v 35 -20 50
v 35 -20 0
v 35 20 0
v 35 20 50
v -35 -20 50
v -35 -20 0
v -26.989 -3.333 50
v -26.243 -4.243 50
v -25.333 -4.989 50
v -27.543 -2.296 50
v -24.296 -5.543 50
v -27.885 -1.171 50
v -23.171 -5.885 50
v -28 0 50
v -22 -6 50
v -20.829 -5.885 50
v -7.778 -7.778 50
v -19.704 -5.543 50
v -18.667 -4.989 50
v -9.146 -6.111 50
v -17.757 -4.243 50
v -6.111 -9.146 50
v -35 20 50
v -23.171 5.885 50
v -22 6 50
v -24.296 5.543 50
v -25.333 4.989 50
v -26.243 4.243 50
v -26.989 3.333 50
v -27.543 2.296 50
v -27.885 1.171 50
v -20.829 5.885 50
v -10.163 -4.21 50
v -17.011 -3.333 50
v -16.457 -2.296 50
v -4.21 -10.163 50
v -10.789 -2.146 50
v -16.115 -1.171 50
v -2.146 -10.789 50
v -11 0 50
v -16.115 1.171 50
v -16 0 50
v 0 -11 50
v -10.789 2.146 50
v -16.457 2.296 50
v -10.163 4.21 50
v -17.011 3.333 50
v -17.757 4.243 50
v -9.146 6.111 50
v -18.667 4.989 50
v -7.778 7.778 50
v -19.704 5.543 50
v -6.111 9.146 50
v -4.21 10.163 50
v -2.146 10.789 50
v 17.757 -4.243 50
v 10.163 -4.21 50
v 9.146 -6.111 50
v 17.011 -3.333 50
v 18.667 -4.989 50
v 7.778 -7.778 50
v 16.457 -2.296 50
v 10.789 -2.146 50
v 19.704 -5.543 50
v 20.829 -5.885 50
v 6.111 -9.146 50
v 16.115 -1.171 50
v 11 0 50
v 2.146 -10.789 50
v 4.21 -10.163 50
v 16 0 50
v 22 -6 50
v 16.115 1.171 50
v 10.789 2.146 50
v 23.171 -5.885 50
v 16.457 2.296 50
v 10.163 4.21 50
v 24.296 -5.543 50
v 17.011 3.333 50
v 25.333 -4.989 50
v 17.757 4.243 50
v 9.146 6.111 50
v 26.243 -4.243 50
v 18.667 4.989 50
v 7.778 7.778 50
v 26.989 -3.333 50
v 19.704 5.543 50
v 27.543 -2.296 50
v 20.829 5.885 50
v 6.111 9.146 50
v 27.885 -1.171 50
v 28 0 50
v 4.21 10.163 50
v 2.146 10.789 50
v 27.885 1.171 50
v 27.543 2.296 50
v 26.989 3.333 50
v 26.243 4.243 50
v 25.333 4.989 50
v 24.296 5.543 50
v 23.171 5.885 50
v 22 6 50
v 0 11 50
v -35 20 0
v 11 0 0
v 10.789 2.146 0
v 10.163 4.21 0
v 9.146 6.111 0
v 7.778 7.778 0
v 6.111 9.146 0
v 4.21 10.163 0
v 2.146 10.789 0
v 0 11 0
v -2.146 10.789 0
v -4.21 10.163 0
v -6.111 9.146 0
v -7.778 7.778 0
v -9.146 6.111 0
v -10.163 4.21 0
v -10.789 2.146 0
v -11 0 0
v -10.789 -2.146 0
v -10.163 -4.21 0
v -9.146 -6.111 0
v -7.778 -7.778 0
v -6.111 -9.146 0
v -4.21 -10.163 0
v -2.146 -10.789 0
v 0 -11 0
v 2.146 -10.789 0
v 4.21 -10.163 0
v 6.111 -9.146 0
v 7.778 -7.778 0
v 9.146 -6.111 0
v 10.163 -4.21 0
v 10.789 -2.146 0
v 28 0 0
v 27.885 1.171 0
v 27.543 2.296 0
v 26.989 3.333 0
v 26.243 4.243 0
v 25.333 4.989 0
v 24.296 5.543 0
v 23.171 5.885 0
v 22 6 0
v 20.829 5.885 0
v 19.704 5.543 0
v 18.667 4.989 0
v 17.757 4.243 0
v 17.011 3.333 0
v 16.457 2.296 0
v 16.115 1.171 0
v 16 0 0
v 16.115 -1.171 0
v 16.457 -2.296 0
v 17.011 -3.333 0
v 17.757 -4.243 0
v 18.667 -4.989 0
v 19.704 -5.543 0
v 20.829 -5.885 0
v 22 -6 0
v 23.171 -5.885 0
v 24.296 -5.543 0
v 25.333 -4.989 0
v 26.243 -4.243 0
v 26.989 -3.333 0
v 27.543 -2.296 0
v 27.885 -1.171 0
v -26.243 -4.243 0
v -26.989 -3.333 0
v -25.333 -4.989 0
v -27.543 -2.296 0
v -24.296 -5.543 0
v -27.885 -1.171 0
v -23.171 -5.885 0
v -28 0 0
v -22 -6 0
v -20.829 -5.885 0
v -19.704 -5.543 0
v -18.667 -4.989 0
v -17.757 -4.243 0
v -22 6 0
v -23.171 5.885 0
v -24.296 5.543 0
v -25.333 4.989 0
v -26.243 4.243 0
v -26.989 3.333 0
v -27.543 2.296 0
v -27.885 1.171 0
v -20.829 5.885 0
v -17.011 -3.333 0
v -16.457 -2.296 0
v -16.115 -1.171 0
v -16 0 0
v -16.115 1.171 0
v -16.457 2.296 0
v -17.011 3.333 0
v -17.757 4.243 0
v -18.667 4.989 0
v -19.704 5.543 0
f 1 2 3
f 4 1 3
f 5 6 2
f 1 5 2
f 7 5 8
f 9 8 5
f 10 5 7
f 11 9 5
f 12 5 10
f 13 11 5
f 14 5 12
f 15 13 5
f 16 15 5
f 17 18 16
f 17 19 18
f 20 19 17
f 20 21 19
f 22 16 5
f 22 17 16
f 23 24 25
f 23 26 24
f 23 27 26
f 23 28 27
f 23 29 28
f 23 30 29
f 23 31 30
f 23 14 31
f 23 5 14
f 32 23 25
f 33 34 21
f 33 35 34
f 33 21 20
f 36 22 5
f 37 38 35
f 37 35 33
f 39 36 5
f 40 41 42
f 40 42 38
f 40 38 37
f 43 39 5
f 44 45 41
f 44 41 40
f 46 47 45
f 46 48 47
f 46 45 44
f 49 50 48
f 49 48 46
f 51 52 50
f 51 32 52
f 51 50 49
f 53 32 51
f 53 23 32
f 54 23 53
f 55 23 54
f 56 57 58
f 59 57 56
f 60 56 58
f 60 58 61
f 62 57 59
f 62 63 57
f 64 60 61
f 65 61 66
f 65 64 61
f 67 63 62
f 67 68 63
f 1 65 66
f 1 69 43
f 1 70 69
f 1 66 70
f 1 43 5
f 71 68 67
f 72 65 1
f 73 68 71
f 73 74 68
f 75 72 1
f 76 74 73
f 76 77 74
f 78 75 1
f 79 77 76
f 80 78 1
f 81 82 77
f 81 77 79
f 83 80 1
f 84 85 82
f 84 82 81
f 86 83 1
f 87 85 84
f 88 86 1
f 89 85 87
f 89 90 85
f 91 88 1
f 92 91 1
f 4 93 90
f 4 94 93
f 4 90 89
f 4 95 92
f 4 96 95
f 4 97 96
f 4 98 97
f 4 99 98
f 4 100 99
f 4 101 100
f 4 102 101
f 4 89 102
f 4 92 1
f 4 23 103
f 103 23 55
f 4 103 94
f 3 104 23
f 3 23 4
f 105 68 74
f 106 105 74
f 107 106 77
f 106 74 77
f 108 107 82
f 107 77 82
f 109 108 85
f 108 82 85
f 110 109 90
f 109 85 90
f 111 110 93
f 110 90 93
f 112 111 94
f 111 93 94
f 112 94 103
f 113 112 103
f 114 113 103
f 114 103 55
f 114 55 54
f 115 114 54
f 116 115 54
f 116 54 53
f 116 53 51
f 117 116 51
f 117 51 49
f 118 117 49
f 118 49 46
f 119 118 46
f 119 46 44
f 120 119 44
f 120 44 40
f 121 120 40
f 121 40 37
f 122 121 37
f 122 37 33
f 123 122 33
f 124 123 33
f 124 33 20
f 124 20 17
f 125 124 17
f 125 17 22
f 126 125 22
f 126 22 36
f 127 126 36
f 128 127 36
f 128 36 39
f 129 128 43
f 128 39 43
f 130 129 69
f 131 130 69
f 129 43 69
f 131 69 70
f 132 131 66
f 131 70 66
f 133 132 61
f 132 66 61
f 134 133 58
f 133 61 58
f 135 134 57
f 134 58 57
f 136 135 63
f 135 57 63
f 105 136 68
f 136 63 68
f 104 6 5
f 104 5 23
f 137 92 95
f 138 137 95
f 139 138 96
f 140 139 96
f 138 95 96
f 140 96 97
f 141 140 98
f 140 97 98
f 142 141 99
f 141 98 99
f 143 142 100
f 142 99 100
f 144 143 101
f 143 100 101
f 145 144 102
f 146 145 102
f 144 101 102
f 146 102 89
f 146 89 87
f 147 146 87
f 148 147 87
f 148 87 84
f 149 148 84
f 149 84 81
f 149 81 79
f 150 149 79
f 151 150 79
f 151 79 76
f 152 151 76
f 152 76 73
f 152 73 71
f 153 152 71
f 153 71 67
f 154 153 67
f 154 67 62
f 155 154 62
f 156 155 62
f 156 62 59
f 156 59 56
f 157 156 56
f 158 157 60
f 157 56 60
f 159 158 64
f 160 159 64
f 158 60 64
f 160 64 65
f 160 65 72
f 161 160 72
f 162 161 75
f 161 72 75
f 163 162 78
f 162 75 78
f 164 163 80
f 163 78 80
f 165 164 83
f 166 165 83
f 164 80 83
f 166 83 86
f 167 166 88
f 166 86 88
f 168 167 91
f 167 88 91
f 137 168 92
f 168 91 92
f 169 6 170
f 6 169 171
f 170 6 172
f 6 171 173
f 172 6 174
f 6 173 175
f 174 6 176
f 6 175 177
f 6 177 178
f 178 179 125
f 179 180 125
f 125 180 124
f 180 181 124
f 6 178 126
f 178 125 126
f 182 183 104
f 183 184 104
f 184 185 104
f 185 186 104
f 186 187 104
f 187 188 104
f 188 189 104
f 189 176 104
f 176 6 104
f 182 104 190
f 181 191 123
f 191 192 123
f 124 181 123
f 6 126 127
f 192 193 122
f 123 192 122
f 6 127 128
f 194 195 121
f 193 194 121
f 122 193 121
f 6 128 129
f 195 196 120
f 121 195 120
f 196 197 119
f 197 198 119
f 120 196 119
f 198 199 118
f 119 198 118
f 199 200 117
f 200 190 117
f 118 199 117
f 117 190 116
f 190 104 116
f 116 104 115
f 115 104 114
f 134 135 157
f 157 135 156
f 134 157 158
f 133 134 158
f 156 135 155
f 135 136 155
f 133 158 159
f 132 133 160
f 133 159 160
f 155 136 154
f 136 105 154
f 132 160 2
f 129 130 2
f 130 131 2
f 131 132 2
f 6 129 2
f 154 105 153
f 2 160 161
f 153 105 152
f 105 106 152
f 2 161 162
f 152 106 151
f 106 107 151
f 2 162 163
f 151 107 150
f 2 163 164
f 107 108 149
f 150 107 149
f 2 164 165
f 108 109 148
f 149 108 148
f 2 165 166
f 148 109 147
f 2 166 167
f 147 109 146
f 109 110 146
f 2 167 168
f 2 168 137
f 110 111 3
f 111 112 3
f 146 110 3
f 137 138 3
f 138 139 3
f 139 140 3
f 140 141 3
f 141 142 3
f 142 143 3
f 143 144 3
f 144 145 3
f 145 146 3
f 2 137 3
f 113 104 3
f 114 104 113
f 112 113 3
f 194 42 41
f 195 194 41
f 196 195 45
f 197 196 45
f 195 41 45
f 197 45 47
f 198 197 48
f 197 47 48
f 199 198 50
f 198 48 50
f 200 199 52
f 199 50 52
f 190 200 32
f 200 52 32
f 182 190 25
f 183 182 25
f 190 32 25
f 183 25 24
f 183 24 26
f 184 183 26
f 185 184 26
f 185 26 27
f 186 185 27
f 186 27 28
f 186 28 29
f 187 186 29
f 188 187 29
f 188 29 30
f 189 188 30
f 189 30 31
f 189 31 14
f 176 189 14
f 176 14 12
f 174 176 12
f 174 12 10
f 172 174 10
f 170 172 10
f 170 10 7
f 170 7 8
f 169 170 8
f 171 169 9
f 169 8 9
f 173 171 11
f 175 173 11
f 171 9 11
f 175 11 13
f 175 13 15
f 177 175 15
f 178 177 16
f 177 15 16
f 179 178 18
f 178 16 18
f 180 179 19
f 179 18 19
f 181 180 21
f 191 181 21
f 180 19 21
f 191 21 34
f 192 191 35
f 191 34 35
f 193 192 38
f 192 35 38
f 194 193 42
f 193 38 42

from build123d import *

# Parameters (mm, degrees)
SKETCH1_W           = 70
SKETCH1_H           = 40
BOSS_EXTRUDE1_DEPTH = 50
SKETCH2_R           = 11
CUT_EXTRUDE1_DEPTH  = 65.226162893
SKETCH3_R           = 6
CUT_EXTRUDE2_DEPTH  = 65.226162893


with BuildPart() as part:
    # Sketch1 → Boss-Extrude1 (new body)
    with BuildSketch(Plane.XY):
        Rectangle(SKETCH1_W, SKETCH1_H)
    extrude(amount=BOSS_EXTRUDE1_DEPTH)

    # Sketch2 → Cut-Extrude1 (cut, through all)
    with BuildSketch(Plane.XY.offset(50)):
        Circle(SKETCH2_R)
    extrude(amount=-CUT_EXTRUDE1_DEPTH, mode=Mode.SUBTRACT)

    # Sketch3 → Cut-Extrude2 (cut, through all)
    with BuildSketch(Plane.XY.offset(50)):
        with Locations((-22, 0)):
            Circle(SKETCH3_R)
        with Locations((22, 0)):
            Circle(SKETCH3_R)
    extrude(amount=-CUT_EXTRUDE2_DEPTH, mode=Mode.SUBTRACT)


solid = part.part
